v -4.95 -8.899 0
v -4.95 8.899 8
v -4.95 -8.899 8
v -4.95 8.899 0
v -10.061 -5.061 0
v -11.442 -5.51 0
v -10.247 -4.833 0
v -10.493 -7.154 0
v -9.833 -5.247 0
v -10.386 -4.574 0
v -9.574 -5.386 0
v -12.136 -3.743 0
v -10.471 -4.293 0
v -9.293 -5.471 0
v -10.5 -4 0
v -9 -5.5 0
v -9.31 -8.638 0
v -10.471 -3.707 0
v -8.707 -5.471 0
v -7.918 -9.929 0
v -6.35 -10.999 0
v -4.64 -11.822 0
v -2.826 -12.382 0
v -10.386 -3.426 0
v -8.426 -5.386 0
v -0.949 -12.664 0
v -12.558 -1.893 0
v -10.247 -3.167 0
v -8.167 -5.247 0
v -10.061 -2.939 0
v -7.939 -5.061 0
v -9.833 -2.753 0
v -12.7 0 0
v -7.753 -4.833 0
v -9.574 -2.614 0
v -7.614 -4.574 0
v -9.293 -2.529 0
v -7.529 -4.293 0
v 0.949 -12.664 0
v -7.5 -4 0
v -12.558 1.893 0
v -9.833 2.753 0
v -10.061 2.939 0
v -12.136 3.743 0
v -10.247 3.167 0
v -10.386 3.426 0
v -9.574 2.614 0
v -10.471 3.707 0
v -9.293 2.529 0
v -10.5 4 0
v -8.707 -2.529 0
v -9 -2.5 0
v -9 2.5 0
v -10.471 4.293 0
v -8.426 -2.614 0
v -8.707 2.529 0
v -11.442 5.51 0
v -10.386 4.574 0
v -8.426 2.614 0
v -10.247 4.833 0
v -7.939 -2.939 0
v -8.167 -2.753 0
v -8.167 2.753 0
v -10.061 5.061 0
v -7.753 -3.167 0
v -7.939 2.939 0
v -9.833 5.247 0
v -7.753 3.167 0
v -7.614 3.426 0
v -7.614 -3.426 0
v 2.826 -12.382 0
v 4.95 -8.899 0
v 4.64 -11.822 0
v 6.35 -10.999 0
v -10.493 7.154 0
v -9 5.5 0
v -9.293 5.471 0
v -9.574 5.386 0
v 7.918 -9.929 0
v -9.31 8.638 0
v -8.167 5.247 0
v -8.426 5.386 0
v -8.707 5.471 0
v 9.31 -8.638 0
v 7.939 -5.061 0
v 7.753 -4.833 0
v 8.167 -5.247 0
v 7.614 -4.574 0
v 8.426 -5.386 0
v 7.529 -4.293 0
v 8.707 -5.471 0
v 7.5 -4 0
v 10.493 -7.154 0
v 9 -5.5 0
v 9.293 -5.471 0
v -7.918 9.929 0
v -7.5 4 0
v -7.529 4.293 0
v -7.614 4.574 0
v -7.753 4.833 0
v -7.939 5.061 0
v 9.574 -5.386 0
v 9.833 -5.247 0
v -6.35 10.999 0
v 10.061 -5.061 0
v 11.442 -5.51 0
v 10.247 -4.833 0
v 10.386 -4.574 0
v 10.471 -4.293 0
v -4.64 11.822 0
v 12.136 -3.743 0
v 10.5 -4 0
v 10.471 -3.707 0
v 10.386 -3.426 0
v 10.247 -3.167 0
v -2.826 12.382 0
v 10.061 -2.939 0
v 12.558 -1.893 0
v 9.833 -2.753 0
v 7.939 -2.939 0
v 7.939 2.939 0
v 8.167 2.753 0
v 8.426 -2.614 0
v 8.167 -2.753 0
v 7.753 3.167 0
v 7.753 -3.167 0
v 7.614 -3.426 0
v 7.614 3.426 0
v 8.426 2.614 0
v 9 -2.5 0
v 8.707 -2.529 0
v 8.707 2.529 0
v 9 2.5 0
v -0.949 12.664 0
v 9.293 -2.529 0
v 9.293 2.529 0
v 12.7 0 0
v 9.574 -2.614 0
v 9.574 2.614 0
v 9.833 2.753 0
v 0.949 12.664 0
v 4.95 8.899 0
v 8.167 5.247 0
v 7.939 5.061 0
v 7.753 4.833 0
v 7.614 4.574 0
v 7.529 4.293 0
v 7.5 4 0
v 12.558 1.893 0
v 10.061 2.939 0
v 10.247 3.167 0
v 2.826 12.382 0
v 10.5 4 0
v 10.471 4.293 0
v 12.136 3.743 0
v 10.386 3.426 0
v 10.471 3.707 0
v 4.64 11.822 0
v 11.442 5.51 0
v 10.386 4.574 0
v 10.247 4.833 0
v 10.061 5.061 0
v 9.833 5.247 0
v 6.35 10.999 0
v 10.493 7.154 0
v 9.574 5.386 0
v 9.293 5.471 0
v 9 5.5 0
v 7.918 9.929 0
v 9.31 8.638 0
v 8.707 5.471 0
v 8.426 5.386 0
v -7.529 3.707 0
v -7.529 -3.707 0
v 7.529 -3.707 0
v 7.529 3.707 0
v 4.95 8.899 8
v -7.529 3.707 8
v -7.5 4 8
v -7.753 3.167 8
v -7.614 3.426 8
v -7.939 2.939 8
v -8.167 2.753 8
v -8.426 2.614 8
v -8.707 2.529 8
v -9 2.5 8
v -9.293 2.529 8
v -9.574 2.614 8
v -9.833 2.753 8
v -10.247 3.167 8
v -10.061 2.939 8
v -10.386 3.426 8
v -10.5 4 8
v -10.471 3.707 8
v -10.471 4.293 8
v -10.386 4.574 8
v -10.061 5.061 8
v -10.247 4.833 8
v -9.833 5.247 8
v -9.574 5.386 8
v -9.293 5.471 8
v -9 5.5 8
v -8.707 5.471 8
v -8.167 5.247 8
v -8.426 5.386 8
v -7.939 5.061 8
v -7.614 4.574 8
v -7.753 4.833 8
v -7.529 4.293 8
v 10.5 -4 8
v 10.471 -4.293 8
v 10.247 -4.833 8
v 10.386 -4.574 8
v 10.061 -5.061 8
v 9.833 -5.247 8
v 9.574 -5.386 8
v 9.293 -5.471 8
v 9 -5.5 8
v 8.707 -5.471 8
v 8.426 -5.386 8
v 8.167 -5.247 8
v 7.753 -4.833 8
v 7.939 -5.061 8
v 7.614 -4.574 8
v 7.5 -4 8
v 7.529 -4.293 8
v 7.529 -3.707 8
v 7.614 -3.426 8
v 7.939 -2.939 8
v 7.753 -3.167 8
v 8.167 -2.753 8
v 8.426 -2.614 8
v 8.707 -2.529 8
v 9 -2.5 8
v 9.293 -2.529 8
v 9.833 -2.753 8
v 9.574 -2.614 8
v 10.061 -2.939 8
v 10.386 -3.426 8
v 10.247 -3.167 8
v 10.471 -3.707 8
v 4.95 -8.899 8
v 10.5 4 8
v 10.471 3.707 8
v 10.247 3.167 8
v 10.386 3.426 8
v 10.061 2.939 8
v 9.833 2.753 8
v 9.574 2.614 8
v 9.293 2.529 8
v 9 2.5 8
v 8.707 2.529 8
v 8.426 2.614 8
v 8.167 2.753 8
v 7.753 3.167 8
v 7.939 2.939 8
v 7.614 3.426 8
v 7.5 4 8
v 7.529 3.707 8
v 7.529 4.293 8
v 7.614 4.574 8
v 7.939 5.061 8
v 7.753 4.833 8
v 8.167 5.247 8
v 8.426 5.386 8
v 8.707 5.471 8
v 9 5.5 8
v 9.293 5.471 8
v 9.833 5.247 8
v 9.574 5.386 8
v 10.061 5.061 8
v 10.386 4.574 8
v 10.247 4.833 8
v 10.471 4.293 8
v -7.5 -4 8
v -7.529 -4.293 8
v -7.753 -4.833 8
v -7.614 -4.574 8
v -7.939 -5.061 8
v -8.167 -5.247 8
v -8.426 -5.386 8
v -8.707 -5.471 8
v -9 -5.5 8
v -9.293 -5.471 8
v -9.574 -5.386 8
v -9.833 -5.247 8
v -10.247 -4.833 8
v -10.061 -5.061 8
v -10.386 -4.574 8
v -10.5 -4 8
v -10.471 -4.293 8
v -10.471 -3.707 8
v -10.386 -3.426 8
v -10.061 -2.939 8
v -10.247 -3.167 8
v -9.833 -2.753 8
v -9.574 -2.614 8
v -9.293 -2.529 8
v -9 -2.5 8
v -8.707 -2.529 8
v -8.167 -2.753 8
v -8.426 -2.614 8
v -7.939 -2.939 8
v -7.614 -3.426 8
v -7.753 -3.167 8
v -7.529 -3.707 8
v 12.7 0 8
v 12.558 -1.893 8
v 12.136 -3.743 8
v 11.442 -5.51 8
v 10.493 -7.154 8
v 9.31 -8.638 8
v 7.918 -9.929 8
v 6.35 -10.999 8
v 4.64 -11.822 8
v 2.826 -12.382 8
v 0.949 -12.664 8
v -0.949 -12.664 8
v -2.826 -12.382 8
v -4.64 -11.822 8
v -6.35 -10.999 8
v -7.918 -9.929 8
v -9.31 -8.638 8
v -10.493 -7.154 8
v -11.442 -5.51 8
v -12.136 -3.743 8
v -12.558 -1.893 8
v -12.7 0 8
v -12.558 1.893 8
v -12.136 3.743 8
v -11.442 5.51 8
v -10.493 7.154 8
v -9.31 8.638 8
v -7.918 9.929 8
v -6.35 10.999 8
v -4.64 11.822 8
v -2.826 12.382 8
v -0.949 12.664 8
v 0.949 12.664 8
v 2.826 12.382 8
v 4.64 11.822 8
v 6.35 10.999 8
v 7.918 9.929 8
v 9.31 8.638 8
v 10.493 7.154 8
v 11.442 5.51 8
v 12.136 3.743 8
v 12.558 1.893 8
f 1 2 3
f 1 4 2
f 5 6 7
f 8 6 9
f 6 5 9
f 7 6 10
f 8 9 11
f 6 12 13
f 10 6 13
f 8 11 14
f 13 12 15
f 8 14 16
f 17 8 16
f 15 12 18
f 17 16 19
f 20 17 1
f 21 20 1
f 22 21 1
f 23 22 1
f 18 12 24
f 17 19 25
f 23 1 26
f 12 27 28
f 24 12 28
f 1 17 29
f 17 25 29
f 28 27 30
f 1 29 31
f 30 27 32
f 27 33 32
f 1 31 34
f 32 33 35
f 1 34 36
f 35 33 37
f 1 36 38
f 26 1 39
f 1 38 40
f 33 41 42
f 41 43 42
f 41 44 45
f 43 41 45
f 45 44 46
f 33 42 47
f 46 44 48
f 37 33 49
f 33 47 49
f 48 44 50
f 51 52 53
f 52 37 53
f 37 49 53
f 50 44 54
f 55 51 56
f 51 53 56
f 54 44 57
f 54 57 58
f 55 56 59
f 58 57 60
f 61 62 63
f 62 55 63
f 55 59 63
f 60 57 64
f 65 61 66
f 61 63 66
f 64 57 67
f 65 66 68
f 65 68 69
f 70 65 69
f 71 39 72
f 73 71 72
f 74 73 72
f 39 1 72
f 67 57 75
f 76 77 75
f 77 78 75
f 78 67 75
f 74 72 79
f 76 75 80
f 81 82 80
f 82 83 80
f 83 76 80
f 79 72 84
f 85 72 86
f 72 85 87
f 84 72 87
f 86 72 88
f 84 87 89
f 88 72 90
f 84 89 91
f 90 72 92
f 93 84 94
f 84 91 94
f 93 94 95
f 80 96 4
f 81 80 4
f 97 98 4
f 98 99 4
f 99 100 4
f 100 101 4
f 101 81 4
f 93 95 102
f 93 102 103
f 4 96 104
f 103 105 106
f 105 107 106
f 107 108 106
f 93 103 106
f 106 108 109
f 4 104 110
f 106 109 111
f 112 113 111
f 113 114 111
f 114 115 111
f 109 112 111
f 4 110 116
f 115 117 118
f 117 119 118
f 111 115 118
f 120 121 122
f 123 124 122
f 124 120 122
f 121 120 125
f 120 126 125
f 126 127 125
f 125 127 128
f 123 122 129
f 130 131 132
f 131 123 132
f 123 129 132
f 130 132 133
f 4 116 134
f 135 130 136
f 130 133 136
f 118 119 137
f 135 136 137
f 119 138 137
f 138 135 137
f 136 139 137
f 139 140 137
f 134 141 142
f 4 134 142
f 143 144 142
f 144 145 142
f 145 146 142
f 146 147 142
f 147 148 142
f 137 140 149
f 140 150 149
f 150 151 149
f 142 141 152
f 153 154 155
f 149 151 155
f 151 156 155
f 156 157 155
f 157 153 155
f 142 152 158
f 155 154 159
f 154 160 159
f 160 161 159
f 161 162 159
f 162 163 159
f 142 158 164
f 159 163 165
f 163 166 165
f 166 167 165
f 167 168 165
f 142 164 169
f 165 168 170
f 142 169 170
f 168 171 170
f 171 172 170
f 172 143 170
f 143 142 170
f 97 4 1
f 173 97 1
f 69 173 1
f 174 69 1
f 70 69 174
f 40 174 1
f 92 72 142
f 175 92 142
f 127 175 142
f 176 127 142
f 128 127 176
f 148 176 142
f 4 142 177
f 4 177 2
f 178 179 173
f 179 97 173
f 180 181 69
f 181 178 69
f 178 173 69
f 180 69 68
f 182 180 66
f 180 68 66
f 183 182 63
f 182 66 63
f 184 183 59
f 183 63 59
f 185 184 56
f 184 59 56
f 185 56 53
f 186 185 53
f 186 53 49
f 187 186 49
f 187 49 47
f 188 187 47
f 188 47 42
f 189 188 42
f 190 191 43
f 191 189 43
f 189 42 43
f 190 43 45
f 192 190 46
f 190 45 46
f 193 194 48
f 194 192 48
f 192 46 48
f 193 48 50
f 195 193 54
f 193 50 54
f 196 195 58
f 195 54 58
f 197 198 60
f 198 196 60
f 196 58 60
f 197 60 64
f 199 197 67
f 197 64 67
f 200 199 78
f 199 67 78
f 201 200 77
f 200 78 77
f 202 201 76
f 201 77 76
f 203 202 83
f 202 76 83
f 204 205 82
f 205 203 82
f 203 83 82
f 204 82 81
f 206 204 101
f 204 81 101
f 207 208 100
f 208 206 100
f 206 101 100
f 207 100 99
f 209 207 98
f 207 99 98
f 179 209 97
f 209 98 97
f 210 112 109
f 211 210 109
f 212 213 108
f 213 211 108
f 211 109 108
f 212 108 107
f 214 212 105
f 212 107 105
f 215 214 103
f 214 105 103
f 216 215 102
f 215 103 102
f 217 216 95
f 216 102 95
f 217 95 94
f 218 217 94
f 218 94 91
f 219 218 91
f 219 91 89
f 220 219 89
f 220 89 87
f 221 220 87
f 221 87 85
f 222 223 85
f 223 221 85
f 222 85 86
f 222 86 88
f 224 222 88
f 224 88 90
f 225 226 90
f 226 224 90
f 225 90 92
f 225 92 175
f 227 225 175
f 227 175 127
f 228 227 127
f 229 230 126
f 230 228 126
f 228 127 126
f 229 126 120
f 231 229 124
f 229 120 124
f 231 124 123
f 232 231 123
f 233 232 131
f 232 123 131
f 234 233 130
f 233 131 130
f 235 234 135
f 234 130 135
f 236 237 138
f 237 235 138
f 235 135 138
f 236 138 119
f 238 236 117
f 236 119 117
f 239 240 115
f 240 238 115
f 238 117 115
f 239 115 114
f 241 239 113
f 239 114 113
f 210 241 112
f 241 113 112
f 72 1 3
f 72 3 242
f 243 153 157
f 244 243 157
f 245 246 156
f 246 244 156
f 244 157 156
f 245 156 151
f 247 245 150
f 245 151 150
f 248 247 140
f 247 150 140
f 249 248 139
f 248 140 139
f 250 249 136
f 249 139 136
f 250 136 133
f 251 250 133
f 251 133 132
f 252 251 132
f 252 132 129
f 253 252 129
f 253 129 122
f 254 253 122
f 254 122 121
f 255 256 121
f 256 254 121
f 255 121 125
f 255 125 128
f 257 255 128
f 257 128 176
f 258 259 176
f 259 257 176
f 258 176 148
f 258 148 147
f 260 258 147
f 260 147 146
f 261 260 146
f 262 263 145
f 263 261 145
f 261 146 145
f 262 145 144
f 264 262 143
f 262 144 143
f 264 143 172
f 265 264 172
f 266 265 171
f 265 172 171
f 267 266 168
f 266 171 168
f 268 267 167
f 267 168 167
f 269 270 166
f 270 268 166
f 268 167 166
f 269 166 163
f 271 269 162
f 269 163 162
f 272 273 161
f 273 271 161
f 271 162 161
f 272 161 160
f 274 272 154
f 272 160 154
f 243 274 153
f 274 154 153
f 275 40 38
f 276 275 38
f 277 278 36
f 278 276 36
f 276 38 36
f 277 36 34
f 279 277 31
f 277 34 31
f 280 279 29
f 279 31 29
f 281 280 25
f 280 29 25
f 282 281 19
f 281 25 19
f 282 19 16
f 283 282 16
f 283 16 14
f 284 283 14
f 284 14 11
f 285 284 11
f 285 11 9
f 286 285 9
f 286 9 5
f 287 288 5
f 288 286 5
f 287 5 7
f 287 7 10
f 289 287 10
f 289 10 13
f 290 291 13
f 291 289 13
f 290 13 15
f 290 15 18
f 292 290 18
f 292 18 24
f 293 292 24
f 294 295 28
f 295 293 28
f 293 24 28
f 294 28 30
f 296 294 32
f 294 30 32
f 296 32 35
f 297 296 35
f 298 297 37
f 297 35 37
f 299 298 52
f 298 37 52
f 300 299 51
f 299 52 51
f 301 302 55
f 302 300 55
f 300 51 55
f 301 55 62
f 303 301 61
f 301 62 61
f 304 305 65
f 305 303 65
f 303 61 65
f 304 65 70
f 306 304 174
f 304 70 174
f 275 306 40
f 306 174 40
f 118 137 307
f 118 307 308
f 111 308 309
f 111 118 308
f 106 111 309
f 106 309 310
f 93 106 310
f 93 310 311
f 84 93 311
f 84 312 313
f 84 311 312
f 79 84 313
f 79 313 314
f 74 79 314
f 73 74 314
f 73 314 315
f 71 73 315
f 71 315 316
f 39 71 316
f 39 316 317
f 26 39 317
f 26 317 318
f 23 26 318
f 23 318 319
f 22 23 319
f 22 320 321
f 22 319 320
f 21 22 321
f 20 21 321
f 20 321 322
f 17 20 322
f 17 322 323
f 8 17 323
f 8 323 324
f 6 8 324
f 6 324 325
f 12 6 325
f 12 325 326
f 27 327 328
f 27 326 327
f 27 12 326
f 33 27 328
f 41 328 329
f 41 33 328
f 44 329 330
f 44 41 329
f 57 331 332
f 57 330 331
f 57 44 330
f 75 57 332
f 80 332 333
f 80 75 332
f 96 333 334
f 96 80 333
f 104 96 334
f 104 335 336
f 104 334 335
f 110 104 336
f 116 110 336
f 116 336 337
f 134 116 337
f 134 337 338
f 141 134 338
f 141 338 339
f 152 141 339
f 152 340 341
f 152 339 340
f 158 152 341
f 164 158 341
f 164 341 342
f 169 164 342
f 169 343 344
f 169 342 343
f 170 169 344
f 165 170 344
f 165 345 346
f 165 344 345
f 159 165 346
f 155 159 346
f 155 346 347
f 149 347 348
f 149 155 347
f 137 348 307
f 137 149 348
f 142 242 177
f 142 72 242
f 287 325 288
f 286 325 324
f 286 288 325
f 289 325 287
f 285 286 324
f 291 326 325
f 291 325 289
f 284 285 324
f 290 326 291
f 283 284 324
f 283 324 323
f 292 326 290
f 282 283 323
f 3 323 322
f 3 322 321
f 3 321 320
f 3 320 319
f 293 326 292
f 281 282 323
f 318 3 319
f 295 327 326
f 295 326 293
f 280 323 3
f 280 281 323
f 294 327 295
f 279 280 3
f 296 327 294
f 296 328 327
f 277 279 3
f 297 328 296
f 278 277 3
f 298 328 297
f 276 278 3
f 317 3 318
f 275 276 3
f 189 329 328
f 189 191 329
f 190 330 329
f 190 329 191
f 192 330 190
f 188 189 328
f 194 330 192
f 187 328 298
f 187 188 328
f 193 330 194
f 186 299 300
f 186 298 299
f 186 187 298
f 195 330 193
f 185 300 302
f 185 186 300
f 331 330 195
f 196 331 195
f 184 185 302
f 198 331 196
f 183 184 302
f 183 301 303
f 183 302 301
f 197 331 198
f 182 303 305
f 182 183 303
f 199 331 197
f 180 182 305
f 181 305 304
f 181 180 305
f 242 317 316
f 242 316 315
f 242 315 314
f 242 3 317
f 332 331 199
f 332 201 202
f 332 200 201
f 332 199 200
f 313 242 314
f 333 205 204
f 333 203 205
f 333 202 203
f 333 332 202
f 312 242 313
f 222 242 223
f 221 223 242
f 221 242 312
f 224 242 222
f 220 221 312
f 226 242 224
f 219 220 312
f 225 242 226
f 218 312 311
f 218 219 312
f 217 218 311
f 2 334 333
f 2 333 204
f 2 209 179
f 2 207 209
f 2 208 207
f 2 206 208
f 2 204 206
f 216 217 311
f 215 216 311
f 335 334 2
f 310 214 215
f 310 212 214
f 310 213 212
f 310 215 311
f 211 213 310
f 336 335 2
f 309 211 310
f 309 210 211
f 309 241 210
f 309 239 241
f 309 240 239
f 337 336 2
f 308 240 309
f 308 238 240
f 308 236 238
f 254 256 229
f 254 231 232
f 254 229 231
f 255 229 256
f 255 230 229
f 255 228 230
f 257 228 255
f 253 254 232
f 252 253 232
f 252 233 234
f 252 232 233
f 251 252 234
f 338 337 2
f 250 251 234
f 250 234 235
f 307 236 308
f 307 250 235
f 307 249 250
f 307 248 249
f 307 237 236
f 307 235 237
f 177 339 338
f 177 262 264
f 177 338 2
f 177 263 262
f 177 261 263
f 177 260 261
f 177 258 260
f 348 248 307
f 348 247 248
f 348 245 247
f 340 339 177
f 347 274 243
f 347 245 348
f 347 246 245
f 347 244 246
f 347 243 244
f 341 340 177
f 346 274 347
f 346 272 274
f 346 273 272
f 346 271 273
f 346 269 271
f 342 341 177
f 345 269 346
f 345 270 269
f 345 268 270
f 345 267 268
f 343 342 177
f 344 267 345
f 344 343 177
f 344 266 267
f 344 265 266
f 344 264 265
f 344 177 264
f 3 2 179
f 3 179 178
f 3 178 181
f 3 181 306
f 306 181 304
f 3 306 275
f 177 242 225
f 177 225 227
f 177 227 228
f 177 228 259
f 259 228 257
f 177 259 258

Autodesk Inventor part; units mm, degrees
ref_plane "YZ Plane" through (0, 0, 0) normal (1, 0, 0) x (0, 1, 0)
ref_plane "XZ Plane" through (0, 0, 0) normal (0, 1, 0) x (-1, 0, 0)
ref_plane "XY Plane" through (0, 0, 0) normal (0, 0, 1) x (1, 0, 0)
sketch "Sketch3" plane through (0, 0, 0) normal (0, 0, 1) x (1, 0, 0)
  line L0 (-15.8918, -16.7) -> (15.8918, -16.7)
  line L1 (16.7, -15.7) -> (16.7, 15.7)
  line L2 (15.8918, 16.7) -> (-15.8918, 16.7)
  line L3 (-16.7, 15.7) -> (-16.7, -15.7)
  line L4 (-15.8918, 16.7) -> (-16.7, 15.7)
  line L5 (15.8918, 16.7) -> (16.7, 15.7)
  line L6 (16.7, -15.7) -> (15.8918, -16.7)
  line L7 (-16.7, -15.7) -> (-15.8918, -16.7)
  line L8 (-4.9497, -8.8994) -> (4.9497, -8.8994)
  line L9 (4.9497, -8.8994) -> (4.9497, 8.8994)
  line L10 (4.9497, 8.8994) -> (-4.9497, 8.8994)
  line L11 (-4.9497, 8.8994) -> (-4.9497, -8.8994)
  circle A0 centre (-12.14, 12.625) radius 2.045
  circle A1 centre (12.14, 12.625) radius 2.045
  line L12 (0, -16.7) -> (0, 16.7) construction
  circle A2 centre (-12.14, -12.625) radius 2.045
  circle A3 centre (12.14, -12.625) radius 2.045
  line L13 (12.14, 12.625) -> (-12.14, 12.625) construction
  line L14 (-12.14, 12.625) -> (-12.14, -12.625) construction
  line L15 (-12.14, -12.625) -> (12.14, -12.625) construction
  line L16 (12.14, -12.625) -> (12.14, 12.625) construction
  line L17 (-16.7, 0) -> (16.7, 0) construction
  circle A4 centre (0, 0) radius 18.4 construction
  circle A5 centre (-9, 4) radius 1.5
  circle A6 centre (9, 4) radius 1.5
  circle A7 centre (-9, -4) radius 1.5
  circle A8 centre (9, -4) radius 1.5
  dimension "d10" = 9.8994
  dimension "d11" = 17.7988
  dimension "d12" = 4.09
  dimension "d13" = 4.09
  dimension "d17" = 4.09
  dimension "d19" = 24.28
  dimension "d20" = 25.25
  dimension "d21" = 4.09
  dimension "d22" = 12.625
  dimension "d26" = 36.8
  dimension "d38" = 12.14
  dimension "d39" = 33.4
  dimension "d40" = 33.4
  dimension "d45" = 3
  dimension "d46" = 3
  dimension "d47" = 3
  dimension "d48" = 3
  dimension "d49" = 4
  dimension "d57" = 8.8994
  dimension "d58" = 4.9497
  dimension "d59" = 9
  dimension "d60" = 9
  dimension "d61" = 9
  dimension "d62" = 9
  dimension "d63" = 4
  dimension "d64" = 4
  dimension "d65" = 4
sketch "Sketch4" plane through (0, 0, 0) normal (0, 0, 1) x (1, 0, 0)
  circle A0 centre (0, 0) radius 12.7
  dimension "d32" = 25.4
extrude "Extrusion5" add sketch "Sketch3" along normal blind 8
extrude "Extrusion6" cut sketch "Sketch4" along normal blind 8 keep common part
properties part number "WG18FLANGECutDown" material "Brass, Soft Yellow"
